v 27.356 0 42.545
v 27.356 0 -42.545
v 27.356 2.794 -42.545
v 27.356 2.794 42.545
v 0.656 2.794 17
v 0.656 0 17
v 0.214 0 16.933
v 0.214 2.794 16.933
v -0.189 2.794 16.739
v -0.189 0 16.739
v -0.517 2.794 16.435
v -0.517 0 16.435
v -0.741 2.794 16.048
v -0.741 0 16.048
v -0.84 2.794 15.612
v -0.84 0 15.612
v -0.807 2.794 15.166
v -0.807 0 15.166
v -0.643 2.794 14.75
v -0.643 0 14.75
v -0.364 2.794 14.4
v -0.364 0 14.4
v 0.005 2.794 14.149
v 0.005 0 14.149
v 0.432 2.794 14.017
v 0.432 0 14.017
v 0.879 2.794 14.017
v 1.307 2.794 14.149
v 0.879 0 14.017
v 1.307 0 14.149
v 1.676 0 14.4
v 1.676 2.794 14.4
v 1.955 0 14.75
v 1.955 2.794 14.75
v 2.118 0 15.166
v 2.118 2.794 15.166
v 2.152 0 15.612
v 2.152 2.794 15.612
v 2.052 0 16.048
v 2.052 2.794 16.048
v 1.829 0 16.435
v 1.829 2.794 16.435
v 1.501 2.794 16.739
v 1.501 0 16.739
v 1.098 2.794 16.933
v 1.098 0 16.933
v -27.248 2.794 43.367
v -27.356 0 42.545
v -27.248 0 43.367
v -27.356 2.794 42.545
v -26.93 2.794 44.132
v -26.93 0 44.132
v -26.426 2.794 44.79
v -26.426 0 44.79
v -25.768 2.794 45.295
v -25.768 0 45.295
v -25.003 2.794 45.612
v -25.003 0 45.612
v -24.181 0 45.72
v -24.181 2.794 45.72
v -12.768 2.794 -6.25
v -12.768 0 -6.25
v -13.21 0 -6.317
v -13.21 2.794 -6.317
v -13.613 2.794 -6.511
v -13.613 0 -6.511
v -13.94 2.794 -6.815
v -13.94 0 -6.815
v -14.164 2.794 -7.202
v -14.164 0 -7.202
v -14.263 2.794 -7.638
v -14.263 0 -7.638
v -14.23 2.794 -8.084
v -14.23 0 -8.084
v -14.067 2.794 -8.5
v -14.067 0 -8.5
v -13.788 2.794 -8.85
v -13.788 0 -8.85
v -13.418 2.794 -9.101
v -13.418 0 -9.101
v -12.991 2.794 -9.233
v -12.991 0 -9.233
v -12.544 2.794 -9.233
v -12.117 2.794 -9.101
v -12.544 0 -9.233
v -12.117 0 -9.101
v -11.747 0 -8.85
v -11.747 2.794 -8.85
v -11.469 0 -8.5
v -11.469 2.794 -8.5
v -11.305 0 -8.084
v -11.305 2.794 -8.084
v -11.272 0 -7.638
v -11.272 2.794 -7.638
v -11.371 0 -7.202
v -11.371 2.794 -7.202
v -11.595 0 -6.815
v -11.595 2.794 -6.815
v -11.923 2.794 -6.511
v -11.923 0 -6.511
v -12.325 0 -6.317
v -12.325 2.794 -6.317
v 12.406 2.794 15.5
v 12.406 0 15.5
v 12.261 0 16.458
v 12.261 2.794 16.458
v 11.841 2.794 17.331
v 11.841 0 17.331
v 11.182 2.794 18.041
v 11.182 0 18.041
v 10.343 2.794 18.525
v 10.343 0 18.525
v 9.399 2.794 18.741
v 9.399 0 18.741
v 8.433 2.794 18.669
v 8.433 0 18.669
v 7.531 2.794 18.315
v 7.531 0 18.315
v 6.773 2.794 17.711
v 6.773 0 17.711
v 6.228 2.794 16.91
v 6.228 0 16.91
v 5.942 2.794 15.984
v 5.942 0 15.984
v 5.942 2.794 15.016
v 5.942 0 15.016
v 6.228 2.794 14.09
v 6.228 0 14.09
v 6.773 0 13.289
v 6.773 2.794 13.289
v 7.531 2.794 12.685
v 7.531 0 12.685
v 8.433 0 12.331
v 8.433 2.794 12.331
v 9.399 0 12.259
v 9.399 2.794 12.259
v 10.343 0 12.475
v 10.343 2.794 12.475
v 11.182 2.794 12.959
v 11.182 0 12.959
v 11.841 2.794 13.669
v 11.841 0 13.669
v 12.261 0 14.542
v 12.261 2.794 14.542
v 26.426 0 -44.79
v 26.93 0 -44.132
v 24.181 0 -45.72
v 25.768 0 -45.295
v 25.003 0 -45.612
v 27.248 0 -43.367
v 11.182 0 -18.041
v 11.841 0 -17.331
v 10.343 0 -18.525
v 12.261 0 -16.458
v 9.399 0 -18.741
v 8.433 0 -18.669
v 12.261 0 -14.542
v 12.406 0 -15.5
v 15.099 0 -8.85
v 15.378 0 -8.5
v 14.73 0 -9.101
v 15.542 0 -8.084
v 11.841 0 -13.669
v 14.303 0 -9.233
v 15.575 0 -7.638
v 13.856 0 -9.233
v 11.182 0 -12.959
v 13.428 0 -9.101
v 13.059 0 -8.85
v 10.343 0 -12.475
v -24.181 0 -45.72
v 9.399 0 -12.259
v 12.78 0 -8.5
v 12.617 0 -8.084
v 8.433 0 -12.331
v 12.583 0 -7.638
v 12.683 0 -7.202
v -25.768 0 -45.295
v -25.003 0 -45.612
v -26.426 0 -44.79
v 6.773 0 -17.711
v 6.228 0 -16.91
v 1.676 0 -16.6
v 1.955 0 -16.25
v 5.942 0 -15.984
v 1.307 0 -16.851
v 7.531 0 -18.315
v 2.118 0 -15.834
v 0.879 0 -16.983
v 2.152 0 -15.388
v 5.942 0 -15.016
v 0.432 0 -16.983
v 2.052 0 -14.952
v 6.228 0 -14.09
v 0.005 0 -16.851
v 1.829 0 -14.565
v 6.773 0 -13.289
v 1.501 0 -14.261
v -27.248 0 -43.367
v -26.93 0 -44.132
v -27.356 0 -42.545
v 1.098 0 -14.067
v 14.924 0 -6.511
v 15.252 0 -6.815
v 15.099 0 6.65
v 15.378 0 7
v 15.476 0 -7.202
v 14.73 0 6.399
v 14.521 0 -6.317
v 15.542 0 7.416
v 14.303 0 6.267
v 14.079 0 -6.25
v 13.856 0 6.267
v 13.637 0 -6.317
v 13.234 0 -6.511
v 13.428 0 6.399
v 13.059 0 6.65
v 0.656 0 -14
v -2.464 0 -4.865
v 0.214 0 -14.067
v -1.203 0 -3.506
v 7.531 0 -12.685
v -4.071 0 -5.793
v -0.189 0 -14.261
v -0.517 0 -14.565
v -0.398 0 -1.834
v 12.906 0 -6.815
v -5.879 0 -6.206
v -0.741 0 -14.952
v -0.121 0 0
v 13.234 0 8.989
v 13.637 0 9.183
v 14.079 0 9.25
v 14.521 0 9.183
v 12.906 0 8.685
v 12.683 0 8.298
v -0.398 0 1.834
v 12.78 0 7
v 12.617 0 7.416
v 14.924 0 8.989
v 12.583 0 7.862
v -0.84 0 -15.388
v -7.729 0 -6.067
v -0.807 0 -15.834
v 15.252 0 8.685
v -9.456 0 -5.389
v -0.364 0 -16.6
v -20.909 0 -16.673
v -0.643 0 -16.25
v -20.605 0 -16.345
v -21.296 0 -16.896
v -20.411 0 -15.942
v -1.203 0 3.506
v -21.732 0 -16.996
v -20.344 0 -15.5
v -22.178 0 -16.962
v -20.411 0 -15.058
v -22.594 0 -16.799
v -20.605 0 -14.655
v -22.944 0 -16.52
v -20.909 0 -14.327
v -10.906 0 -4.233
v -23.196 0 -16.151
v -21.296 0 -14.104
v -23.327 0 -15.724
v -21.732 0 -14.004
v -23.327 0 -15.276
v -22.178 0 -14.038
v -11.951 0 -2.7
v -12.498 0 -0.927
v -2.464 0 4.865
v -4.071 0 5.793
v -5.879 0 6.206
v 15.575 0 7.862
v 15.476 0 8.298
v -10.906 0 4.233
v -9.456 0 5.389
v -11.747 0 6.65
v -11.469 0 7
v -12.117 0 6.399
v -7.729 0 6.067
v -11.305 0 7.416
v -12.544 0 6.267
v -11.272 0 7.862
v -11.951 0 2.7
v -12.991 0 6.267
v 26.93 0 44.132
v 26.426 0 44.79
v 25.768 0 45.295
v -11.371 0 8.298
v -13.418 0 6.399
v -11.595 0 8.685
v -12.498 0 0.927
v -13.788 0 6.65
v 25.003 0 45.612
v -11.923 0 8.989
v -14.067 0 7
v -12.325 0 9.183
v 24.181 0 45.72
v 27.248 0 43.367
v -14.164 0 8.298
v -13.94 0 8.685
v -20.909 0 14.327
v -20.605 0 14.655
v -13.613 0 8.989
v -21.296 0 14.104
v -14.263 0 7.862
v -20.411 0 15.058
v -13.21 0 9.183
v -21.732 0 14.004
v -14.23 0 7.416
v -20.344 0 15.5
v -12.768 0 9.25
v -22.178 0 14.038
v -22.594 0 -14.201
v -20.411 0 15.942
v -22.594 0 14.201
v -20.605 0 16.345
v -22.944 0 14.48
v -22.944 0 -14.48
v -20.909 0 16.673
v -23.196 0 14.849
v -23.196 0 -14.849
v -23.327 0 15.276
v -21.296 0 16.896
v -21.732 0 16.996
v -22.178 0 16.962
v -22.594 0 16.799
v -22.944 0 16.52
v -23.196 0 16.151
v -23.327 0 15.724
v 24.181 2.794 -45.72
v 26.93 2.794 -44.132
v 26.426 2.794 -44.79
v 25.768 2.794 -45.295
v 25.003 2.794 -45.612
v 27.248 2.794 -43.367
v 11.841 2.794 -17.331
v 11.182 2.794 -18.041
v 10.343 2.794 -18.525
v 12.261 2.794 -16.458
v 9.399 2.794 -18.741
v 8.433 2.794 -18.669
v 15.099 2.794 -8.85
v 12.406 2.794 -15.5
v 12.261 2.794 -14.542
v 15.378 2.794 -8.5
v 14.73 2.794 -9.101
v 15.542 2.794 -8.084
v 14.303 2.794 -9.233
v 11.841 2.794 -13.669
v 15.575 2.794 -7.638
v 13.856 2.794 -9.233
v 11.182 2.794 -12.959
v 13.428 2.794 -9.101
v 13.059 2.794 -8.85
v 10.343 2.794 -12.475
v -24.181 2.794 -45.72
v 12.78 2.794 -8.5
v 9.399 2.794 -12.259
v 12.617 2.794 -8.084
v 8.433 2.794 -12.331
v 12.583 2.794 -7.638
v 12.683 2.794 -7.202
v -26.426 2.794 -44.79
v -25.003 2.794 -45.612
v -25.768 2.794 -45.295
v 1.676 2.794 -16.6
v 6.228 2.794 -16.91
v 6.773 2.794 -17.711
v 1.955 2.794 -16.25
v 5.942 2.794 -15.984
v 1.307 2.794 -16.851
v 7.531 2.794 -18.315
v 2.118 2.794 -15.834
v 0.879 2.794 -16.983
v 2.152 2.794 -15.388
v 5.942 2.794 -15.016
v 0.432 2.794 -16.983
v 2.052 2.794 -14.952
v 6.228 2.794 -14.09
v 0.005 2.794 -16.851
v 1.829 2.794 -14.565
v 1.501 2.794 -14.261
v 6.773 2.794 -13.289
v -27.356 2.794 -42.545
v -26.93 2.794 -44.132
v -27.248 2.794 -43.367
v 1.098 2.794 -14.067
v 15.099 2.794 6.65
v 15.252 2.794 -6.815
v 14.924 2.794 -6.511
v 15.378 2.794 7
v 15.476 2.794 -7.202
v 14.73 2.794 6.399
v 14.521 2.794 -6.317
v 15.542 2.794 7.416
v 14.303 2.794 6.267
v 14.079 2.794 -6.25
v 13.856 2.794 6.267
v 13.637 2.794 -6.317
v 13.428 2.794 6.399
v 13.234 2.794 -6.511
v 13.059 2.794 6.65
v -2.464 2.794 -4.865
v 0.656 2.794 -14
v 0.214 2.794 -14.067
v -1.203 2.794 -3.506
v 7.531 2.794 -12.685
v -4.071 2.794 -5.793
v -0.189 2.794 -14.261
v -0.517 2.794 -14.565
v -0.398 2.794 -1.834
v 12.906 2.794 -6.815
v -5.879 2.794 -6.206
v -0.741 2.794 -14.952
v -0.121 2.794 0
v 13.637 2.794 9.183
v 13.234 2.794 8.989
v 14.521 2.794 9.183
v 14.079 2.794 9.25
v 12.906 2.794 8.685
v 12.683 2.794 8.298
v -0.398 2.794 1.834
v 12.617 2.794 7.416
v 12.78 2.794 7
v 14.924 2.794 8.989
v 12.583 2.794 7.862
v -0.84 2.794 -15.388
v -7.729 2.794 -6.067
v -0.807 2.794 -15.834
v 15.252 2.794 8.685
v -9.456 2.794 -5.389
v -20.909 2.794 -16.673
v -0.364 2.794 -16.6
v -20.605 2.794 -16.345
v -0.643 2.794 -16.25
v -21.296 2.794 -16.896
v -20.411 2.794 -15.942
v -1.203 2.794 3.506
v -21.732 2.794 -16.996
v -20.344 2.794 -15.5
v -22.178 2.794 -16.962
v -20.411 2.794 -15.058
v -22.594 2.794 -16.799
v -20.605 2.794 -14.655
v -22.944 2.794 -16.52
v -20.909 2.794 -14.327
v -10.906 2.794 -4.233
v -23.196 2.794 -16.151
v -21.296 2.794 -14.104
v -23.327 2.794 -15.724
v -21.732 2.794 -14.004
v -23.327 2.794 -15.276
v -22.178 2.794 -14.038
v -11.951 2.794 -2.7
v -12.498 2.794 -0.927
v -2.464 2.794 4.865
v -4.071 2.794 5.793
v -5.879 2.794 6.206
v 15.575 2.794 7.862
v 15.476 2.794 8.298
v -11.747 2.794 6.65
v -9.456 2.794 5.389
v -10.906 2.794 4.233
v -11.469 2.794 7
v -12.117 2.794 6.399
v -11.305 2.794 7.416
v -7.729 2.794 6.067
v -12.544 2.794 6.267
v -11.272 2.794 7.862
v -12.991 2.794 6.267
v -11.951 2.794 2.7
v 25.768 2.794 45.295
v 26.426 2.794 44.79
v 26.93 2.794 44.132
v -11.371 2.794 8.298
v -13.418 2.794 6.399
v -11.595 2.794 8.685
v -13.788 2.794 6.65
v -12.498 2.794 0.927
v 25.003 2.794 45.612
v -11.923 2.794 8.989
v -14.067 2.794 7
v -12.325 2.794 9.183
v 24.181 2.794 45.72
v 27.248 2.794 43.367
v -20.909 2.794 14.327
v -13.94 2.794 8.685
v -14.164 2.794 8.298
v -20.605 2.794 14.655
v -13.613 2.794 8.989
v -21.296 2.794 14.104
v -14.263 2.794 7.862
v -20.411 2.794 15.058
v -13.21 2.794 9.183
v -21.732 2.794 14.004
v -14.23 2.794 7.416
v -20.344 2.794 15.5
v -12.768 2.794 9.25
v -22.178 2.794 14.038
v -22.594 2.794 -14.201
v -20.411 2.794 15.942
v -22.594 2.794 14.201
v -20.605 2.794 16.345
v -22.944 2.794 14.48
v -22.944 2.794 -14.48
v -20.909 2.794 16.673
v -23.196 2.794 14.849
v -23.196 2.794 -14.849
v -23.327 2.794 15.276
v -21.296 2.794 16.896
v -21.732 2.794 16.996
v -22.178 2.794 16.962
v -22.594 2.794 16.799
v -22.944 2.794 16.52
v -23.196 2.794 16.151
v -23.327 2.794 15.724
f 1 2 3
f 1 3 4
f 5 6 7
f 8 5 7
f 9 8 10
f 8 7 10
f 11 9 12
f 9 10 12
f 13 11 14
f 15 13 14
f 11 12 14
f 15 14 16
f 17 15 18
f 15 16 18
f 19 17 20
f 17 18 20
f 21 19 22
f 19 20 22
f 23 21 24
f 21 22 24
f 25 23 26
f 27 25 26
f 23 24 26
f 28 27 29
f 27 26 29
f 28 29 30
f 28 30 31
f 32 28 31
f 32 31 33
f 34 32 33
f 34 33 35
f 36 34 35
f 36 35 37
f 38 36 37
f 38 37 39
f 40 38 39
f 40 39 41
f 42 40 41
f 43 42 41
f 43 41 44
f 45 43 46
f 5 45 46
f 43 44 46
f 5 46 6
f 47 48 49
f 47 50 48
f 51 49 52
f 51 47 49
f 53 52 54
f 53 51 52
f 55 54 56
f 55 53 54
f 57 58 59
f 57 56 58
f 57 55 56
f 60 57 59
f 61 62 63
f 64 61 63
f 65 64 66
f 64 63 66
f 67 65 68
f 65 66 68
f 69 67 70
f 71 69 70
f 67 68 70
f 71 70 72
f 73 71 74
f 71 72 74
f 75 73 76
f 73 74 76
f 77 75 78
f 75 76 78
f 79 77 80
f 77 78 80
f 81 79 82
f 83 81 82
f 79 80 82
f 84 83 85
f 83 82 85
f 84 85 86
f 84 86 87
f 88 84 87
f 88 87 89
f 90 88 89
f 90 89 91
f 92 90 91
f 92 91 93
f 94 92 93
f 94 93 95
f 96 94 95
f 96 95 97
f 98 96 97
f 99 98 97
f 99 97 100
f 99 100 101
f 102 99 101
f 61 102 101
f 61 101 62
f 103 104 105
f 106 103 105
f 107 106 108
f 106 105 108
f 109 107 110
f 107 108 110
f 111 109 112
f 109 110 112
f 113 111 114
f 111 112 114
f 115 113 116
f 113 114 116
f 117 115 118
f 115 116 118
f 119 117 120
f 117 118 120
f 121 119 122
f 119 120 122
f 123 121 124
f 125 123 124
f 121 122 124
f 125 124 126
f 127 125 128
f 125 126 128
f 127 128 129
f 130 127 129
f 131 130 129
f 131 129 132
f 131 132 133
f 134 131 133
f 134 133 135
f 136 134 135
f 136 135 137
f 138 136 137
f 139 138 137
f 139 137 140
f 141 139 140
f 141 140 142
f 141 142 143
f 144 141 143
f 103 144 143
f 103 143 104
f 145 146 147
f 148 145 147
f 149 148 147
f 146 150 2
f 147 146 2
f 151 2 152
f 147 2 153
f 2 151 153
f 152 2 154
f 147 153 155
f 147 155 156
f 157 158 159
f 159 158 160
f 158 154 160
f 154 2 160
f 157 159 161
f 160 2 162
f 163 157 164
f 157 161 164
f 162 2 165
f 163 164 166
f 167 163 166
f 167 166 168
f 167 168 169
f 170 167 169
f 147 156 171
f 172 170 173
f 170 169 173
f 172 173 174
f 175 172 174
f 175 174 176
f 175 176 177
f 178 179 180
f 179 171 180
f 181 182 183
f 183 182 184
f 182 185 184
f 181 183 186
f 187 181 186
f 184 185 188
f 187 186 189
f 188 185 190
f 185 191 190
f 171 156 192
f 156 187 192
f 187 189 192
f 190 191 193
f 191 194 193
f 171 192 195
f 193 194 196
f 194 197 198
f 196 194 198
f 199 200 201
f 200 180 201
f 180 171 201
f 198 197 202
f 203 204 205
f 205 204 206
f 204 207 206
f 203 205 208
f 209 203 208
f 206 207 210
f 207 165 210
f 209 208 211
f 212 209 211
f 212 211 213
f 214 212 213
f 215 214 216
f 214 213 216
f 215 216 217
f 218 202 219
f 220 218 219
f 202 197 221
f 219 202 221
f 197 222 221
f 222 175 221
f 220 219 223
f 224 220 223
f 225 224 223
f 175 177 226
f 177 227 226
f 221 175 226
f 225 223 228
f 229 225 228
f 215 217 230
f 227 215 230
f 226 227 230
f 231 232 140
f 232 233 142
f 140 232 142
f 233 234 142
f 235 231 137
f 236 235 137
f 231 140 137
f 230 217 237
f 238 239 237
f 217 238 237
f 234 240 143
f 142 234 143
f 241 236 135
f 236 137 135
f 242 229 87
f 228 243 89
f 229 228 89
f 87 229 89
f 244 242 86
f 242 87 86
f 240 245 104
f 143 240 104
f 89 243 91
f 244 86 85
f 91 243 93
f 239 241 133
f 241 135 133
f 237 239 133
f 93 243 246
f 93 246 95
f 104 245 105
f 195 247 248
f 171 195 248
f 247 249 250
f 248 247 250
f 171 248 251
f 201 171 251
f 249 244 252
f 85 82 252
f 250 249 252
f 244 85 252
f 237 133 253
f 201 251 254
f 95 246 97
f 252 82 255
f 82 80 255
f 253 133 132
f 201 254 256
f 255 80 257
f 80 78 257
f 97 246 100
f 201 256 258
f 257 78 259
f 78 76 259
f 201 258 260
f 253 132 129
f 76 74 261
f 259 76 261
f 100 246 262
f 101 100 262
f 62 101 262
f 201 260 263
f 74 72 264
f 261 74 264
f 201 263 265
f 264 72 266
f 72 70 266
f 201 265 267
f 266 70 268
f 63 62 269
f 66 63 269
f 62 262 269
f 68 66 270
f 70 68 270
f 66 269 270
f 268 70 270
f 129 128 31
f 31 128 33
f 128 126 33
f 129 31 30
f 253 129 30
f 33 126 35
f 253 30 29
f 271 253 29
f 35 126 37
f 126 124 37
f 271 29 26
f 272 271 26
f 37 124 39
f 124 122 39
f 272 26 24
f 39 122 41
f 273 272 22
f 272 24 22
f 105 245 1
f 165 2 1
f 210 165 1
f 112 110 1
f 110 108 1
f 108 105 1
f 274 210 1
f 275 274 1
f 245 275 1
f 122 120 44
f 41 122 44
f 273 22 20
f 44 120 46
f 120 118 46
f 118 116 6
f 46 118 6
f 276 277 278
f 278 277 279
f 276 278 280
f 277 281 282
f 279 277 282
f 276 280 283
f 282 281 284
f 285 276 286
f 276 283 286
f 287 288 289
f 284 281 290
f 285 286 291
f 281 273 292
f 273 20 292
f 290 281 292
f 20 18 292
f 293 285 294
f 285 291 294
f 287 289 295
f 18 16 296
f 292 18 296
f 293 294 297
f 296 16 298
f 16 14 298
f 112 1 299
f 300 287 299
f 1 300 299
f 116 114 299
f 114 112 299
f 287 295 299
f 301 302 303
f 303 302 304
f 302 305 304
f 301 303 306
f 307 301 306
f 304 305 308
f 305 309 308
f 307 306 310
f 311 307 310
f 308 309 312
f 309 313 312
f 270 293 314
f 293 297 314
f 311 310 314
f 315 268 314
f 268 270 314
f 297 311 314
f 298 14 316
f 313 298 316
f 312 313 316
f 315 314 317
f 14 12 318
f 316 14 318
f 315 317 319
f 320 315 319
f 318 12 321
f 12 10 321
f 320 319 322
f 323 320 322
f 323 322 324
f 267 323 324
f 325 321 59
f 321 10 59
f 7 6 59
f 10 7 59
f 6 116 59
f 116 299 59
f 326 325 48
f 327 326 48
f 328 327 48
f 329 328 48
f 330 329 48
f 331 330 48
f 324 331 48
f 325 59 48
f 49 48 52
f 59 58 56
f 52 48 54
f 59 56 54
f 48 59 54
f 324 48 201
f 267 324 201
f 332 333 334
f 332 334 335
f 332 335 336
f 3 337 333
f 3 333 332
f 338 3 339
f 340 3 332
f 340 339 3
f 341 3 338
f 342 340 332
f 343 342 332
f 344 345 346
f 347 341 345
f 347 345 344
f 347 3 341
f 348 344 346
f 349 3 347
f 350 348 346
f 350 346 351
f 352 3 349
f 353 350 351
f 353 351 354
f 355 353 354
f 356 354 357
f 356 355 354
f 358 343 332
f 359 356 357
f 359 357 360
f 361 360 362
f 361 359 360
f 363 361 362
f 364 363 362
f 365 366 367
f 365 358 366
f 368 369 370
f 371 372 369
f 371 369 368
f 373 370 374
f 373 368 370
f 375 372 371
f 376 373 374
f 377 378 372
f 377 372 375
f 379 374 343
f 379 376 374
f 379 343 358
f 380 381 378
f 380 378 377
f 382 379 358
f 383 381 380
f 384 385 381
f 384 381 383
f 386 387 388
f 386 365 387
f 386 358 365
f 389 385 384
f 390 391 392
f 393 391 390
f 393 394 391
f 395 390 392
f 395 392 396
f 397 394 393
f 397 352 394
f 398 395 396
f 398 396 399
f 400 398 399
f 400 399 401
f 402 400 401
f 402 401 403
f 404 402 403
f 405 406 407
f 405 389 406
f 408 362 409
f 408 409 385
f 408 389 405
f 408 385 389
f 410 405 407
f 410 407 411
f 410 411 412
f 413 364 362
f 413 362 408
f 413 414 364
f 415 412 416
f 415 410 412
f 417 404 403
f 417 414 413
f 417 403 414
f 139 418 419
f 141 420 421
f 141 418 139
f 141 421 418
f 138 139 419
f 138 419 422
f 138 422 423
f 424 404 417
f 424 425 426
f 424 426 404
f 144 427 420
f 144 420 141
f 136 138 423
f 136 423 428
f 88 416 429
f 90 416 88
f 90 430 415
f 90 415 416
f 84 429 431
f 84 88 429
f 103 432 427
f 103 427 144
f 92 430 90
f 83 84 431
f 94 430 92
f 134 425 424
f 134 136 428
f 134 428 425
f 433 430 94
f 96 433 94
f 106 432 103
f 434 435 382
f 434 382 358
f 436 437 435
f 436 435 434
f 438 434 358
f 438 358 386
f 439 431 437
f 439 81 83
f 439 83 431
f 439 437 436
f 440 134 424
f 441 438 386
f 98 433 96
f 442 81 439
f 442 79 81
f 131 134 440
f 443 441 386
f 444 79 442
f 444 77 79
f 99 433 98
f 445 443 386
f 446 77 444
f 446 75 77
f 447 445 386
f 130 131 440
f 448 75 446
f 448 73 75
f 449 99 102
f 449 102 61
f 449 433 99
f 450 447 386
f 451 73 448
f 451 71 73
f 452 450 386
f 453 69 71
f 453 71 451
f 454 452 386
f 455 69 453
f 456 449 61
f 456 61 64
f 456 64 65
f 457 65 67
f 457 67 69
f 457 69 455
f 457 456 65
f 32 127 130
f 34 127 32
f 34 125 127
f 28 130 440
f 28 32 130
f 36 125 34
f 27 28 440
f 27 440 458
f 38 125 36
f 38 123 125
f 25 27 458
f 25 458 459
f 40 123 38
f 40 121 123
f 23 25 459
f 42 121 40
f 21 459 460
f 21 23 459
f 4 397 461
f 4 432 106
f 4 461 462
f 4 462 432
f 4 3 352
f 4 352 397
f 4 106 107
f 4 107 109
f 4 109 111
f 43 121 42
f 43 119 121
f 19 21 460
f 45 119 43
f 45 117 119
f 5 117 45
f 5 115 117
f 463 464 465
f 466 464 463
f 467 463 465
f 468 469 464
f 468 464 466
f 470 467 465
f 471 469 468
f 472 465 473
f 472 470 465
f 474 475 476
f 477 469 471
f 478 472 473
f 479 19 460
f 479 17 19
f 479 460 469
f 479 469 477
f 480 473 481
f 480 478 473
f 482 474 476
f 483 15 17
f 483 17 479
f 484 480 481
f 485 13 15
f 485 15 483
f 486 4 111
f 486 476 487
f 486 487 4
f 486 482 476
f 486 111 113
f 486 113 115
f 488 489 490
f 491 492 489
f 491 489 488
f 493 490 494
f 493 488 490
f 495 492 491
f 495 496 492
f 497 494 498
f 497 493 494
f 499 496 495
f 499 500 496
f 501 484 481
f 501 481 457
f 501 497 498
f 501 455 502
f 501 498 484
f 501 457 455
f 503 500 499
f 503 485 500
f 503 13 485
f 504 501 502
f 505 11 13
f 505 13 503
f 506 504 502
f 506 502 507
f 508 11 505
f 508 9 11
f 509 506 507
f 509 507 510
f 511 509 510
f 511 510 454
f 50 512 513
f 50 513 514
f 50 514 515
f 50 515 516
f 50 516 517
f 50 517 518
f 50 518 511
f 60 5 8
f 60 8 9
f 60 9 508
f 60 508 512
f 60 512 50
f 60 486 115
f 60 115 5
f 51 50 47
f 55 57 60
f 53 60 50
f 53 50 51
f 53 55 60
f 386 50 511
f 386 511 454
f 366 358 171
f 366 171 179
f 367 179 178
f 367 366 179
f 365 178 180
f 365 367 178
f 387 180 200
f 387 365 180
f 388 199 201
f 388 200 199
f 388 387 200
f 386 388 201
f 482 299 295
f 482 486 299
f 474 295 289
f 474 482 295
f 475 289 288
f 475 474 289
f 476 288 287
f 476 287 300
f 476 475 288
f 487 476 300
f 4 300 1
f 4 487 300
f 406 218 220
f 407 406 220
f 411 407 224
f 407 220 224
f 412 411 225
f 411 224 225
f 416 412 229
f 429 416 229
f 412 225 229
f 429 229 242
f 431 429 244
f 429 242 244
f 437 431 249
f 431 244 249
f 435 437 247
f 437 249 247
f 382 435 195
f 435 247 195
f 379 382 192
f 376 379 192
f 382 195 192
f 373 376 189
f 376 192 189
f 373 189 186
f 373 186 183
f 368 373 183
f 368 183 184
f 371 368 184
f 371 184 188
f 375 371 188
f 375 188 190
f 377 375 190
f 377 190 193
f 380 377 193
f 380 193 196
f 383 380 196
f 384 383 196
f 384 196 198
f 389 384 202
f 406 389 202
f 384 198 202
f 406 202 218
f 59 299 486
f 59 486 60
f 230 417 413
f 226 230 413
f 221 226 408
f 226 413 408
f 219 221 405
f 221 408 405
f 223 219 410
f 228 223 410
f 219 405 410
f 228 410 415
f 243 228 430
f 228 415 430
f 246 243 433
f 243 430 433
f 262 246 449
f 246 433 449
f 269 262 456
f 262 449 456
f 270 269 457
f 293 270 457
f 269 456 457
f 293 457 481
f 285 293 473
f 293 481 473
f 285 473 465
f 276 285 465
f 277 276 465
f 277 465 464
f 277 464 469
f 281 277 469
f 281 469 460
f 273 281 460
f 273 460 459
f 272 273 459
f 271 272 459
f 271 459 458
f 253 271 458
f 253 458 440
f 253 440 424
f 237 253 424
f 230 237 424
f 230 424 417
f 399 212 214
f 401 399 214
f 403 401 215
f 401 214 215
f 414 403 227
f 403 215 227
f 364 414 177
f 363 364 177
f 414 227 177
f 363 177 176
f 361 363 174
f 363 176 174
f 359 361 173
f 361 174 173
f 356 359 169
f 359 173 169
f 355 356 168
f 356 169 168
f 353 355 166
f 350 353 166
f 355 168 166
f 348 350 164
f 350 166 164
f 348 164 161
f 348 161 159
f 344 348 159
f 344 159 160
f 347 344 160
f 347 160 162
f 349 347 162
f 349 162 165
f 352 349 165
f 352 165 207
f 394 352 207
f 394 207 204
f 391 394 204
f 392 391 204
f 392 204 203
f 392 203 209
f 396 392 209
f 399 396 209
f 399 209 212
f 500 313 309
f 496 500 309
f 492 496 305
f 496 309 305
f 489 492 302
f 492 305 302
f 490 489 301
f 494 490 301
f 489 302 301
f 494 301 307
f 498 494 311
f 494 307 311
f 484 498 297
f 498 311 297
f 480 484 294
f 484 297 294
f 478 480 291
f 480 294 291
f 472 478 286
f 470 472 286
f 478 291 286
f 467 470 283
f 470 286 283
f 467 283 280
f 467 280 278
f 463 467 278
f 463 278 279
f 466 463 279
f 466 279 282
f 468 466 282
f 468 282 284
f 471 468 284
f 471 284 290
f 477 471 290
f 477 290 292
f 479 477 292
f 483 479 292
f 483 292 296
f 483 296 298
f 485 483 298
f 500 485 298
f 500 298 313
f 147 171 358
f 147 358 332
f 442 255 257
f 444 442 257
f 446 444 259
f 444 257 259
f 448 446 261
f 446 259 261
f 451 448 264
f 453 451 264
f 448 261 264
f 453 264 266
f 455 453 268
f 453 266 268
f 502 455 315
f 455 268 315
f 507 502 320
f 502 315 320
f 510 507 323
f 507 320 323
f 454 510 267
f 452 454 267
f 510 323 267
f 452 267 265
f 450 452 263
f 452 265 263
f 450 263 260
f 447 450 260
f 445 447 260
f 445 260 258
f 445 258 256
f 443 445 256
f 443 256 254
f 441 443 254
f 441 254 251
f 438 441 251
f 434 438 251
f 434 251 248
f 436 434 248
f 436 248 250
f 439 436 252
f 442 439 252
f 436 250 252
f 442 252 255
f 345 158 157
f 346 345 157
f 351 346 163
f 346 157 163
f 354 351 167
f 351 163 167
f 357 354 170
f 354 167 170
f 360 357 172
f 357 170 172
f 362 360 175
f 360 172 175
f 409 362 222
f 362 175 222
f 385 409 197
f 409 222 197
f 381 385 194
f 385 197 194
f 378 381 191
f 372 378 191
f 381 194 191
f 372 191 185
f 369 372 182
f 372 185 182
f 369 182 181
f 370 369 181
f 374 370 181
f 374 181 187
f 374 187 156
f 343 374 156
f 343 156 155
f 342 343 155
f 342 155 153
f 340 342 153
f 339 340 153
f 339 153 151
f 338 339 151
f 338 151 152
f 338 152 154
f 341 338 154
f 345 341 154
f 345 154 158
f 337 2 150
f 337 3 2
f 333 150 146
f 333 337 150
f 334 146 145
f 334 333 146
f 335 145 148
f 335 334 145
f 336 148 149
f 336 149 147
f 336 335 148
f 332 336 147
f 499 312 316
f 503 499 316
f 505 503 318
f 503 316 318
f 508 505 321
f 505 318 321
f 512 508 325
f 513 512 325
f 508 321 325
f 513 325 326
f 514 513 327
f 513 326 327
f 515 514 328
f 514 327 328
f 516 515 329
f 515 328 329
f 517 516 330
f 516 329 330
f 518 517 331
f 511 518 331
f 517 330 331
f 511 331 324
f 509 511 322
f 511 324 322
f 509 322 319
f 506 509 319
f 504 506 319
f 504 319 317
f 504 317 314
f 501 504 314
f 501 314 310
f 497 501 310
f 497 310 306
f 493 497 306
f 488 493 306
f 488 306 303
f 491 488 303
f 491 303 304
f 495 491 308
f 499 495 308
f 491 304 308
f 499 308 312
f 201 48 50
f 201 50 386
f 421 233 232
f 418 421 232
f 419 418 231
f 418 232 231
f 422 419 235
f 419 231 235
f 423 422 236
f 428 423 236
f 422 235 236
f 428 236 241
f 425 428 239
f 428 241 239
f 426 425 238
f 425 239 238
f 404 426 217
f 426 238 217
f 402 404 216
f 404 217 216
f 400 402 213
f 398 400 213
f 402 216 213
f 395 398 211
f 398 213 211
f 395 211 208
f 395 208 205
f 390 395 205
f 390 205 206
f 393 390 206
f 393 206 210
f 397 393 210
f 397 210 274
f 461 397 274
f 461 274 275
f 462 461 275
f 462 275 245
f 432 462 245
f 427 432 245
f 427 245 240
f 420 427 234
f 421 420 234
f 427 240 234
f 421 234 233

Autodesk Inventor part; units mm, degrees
ref_plane "YZ Plane" through (0, 0, 0) normal (1, 0, 0) x (0, 1, 0)
ref_plane "XZ Plane" through (0, 0, 0) normal (0, 1, 0) x (-1, 0, 0)
ref_plane "XY Plane" through (0, 0, 0) normal (0, 0, 1) x (1, 0, 0)
sketch "Sketch1" plane through (0, 0, 0) normal (0, 1, 0) x (-1, 0, 0)
  line L0 (-27.3558, 45.72) -> (27.3558, 45.72)
  line L1 (27.3558, 45.72) -> (27.3558, -45.72)
  line L2 (27.3558, -45.72) -> (-27.3558, -45.72)
  line L3 (-27.3558, -45.72) -> (-27.3558, 45.72)
  line L4 (-27.3558, 45.72) -> (27.3558, -45.72) construction
  line L5 (27.3558, 45.72) -> (-27.3558, -45.72) construction
  point P0 (0, 0)
  dimension "d0" = 54.7116
  dimension "d1" = 91.44
extrude "Extrusion1" add sketch "Sketch1" along normal blind 2.794
sketch "Sketch2" plane through (0, 2.794, 0) normal (0, 1, 0) x (1, 0, 0)
  circle A0 centre (-6.3442, 0) radius 6 construction
  circle A1 centre (0.6558, 0) radius 18.4 construction
  circle A2 centre (-7.0942, -13.4234) radius 1.25 construction
  circle A3 centre (-12.7676, -7.75) radius 1.25 construction
  circle A4 centre (-12.7676, 7.75) radius 1.25 construction
  circle A5 centre (-7.0942, 13.4234) radius 1.25 construction
  circle A6 centre (0.6558, 15.5) radius 1.25 construction
  circle A7 centre (14.0792, 7.75) radius 1.25 construction
  circle A8 centre (16.1558, 0) radius 1.25 construction
  circle A9 centre (14.0792, -7.75) radius 1.25 construction
  circle A10 centre (0.6558, -15.5) radius 1.25 construction
  spline S0 degree 3 poles (-6.3442, -8.58) (-7.0027, -8.6329) (-7.0027, -9.0013) (-6.3442, -9.6852) knots -1 -1 -1 -1 0 0 0 0 construction
  arc A11 (-6.3442, -9.6852) -> (-6.3442, 9.6852) centre (0.6558, 0) ccw construction
  spline S1 degree 3 poles (-6.3442, 9.6852) (-7.0027, 9.0013) (-7.0027, 8.6329) (-6.3442, 8.58) knots -1 -1 -1 -1 0 0 0 0 construction
  arc A12 (-6.3442, -8.58) -> (-6.3442, 8.58) centre (-6.3442, 0) ccw construction
  circle A13 centre (-6.3442, 0) radius 6.223
  point P0 (0, 0)
  dimension "d4" = 12.446
hole "Hole1" at (0.6558, 2.794, -15.5) at (0.6558, 2.794, 15.5) at (14.0792, 2.794, -7.75) at (14.0792, 2.794, 7.75) at (-12.7676, 2.794, -7.75) at (-12.7676, 2.794, 7.75) direction (0, -1, 0) diameter 3 end through all
extrude "Extrusion2" cut sketch "Sketch2" against normal blind 25.4
sketch "Sketch3" plane through (0, 2.794, 0) normal (0, 1, 0) x (1, 0, 0)
  point P0 (0, 0)
sketch "Sketch4" plane through (0, 0, 0) normal (0, -1, 0) x (1, 0, 0)
  arc A0 (8.0816, -16.5469) -> (10.5912, -15.0645) centre (9.1558, -15.5) ccw
  arc A1 (10.5912, -15.0645) -> (10.5912, 15.0645) centre (0, 0) ccw
  arc A2 (10.5912, 15.0645) -> (8.0816, 16.5469) centre (9.1558, 15.5) ccw
  arc A3 (8.0816, 16.5469) -> (8.0816, -16.5469) centre (0, 0) ccw
  circle A4 centre (-21.8442, -15.5) radius 1.5
  circle A5 centre (-21.8442, 15.5) radius 1.5
  arc A6 (-27.3558, -42.545) -> (-24.1808, -45.72) centre (-24.1808, -42.545) ccw
  line L0 (-27.3558, -42.545) -> (-27.3558, 42.545)
  arc A7 (-24.1808, 45.72) -> (-27.3558, 42.545) centre (-24.1808, 42.545) ccw
  line L1 (-24.1808, 45.72) -> (24.1808, 45.72)
  arc A8 (27.3558, 42.545) -> (24.1808, 45.72) centre (24.1808, 42.545) ccw
  line L2 (27.3558, 42.545) -> (27.3558, -42.545)
  arc A9 (24.1808, -45.72) -> (27.3558, -42.545) centre (24.1808, -42.545) ccw
  line L3 (24.1808, -45.72) -> (-24.1808, -45.72)
  circle A10 centre (9.1558, -15.5) radius 3.25
  circle A11 centre (9.1558, 15.5) radius 3.25
  point P0 (0, 0)
  dimension "d14" = 6.5
  dimension "d15" = 6.5
extrude "Extrusion3" cut sketch "Sketch4" against normal blind 25.4 contours A3 A10 A1 A0 | A0 A1 A10 A3 | A11 A1 A2 A3 | A3 A2 A1 A11 | A4 | A5
fillet "Fillet1" radius 3.175 4 edges at (-27.3558, 1.397, -45.72) (-27.3558, 1.397, 45.72) (27.3558, 1.397, 45.72) (27.3558, 1.397, -45.72)
equation "\"d15\" = d14"
properties part number "MotorMountDCB" material "Polycarbonate, Smoke"
